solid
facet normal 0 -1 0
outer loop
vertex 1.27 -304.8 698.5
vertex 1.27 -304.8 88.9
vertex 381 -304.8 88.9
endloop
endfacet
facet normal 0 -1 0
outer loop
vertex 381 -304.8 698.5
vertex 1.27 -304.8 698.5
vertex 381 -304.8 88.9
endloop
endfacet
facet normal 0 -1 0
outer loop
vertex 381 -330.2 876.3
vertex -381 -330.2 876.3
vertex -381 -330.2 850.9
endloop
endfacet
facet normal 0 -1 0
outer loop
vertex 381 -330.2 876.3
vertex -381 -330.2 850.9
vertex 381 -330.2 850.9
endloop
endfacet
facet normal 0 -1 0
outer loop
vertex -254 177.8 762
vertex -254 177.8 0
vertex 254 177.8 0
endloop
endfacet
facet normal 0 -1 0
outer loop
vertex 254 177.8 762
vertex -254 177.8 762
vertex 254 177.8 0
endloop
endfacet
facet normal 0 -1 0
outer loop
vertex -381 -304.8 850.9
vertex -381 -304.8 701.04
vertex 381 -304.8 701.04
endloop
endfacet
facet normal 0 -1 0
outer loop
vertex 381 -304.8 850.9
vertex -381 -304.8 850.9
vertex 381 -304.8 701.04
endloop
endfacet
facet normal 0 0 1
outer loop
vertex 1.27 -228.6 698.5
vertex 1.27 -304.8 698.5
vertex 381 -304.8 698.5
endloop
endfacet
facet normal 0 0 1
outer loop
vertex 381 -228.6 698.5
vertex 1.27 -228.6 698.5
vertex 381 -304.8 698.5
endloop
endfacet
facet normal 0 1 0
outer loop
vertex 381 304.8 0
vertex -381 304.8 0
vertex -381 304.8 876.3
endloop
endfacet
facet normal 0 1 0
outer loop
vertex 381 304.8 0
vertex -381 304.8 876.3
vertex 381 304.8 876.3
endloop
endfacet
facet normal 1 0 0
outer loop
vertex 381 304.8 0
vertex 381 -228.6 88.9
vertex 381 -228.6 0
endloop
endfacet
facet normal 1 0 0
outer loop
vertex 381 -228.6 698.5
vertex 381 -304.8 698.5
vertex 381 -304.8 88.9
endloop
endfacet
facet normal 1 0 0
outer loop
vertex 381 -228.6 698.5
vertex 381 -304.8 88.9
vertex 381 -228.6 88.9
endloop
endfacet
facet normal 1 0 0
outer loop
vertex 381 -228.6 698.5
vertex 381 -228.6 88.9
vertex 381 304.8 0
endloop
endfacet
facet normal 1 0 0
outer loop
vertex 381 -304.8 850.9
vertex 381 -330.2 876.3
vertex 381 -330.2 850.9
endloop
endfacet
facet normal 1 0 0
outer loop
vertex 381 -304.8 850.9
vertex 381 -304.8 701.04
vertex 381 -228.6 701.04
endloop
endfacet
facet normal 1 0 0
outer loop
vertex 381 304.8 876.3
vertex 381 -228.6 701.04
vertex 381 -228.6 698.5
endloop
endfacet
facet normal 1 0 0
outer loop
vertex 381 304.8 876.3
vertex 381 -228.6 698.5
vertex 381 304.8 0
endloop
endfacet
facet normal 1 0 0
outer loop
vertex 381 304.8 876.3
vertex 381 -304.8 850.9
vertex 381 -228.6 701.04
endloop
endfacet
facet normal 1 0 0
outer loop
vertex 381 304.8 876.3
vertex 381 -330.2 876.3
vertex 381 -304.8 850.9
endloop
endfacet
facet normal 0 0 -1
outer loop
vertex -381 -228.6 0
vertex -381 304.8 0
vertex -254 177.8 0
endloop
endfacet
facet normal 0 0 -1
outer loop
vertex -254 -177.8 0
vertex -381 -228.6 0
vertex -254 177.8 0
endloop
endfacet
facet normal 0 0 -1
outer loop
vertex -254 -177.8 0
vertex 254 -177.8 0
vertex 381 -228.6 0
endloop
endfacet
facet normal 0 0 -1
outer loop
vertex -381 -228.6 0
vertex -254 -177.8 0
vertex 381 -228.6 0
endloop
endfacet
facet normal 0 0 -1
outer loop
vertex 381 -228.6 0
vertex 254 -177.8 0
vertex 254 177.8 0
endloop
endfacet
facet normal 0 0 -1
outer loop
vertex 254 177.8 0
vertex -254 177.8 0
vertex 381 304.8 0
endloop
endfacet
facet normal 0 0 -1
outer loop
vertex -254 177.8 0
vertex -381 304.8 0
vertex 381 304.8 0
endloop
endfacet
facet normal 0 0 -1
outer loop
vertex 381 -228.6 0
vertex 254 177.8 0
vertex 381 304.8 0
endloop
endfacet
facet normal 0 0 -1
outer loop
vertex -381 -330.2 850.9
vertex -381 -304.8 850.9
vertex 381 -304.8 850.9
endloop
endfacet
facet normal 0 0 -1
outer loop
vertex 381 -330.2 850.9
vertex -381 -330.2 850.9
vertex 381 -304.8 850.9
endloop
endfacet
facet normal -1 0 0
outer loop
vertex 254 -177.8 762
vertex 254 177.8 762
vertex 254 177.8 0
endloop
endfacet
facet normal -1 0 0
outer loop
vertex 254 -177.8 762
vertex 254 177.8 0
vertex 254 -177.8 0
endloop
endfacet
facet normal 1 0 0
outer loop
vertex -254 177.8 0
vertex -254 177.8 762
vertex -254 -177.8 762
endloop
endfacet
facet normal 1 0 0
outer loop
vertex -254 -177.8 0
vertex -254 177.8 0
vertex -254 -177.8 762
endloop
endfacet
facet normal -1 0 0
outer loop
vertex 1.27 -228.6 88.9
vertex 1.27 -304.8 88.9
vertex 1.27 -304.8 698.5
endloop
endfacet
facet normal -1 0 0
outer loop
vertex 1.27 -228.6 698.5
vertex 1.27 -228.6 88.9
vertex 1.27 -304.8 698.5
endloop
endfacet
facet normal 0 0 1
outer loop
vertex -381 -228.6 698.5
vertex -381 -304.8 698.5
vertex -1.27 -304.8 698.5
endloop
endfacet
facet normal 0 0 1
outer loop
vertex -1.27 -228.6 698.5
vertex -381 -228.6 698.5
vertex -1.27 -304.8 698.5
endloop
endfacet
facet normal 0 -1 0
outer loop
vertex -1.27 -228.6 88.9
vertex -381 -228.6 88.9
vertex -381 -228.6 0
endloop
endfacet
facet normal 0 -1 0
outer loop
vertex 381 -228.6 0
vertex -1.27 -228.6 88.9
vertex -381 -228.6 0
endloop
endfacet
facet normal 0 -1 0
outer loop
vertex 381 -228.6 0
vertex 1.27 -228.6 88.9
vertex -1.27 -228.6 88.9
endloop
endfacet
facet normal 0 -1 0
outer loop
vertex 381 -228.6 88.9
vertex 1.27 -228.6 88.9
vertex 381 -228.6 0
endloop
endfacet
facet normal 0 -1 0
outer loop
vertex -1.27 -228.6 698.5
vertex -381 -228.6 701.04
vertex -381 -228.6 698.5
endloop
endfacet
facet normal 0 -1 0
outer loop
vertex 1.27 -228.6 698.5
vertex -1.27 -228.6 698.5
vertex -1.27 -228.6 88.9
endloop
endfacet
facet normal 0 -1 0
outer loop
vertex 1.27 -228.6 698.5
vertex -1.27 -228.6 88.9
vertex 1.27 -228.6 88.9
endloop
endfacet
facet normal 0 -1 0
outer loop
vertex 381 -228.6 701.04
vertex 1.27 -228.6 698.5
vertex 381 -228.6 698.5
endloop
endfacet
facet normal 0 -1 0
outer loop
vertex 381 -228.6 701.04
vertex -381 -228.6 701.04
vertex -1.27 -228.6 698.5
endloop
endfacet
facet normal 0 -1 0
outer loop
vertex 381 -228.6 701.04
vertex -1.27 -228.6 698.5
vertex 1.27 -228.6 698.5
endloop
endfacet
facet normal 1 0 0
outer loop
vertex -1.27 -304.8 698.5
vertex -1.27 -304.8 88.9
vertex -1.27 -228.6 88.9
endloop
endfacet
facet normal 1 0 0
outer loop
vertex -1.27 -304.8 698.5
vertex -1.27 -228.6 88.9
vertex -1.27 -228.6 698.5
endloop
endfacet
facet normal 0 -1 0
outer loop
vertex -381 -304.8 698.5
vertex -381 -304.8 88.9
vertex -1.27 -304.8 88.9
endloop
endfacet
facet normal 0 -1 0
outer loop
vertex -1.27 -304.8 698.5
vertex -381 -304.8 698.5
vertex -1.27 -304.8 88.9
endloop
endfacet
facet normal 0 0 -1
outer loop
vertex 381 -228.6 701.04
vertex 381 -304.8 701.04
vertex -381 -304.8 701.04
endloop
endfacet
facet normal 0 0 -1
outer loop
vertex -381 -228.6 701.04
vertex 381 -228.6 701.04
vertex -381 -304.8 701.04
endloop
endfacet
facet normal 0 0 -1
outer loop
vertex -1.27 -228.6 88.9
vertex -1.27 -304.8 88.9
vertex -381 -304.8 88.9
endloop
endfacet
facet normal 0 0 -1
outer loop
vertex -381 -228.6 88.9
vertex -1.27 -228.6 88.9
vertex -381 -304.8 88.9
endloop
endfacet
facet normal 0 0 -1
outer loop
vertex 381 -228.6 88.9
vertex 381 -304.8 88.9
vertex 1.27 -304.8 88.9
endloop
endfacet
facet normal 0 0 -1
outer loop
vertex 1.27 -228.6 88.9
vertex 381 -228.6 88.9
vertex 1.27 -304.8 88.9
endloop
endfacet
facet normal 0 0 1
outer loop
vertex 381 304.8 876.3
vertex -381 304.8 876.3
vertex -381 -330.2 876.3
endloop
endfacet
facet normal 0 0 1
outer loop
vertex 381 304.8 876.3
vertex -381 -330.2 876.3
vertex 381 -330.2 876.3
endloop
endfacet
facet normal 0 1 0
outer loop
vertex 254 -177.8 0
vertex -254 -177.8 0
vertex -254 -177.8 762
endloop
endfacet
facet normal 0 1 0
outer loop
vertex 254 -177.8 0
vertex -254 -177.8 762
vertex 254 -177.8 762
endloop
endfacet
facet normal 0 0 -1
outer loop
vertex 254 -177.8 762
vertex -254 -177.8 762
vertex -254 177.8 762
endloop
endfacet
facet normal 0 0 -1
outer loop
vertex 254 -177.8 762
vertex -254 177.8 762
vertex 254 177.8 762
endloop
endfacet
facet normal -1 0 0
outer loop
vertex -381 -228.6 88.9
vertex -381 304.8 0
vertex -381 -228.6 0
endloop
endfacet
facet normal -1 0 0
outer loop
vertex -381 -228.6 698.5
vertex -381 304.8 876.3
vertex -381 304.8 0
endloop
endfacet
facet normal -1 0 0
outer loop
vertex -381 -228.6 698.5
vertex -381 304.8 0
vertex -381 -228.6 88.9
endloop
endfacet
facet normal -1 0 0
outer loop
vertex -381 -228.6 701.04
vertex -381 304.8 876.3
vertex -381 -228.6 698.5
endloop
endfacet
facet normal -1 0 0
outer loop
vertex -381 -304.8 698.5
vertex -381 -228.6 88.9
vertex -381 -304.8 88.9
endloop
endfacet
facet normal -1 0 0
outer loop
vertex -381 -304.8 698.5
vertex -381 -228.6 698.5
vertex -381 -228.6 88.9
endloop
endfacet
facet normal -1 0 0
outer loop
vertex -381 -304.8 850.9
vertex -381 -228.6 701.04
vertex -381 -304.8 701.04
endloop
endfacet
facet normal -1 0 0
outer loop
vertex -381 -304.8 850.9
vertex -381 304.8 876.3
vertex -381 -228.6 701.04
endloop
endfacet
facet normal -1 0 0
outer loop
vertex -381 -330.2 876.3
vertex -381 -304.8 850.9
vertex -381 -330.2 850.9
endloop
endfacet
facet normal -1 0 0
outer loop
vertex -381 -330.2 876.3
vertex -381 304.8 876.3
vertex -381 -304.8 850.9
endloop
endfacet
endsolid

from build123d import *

# Parameters (mm, degrees)
F0_W     = 762
F0_H     = 609.6
F1_DEPTH = 876.3
F2_W     = 2.54
F2_H     = 609.6
F3_DEPTH = 76.2
F4_W     = 762
F4_H     = 25.4
F4_H_2   = 609.6
F5_DEPTH = 25.4
F6_W     = 508
F6_H     = 355.6
F7_DEPTH = 762


with BuildPart() as f1:
    # F0 (on Top) → F1 (new body)
    with BuildSketch(Plane.XY):
        Rectangle(F0_W, F0_H)
    extrude(amount=F1_DEPTH)

    # F2 (on face) → F3 (cut)
    with BuildSketch(Plane.XZ.offset(304.8)):
        Polygon((-381, 88.9), (-381, 0), (381, 0), (381, 88.9), (1.27, 88.9), (-1.27, 88.9), align=None)
        Polygon((-381, 701.04), (-381, 698.5), (-1.27, 698.5), (1.27, 698.5), (381, 698.5), (381, 701.04), align=None)
        with Locations((0, 393.7)):
            Rectangle(F2_W, F2_H)
    extrude(amount=-F3_DEPTH, mode=Mode.SUBTRACT)

    # F4 (on face) → F5 (join)
    with BuildSketch(Plane.XY.offset(876.3)):
        with Locations((0, -317.5)):
            Rectangle(F4_W, F4_H)
        Rectangle(F4_W, F4_H_2)
    extrude(amount=-F5_DEPTH)

    # F6 (on face) → F7 (cut)
    with BuildSketch(Plane(origin=(0, 0, 0), x_dir=(1, 0, 0), z_dir=(0, 0, -1))):
        Rectangle(F6_W, F6_H)
    extrude(amount=-F7_DEPTH, mode=Mode.SUBTRACT)


solid = f1.part
